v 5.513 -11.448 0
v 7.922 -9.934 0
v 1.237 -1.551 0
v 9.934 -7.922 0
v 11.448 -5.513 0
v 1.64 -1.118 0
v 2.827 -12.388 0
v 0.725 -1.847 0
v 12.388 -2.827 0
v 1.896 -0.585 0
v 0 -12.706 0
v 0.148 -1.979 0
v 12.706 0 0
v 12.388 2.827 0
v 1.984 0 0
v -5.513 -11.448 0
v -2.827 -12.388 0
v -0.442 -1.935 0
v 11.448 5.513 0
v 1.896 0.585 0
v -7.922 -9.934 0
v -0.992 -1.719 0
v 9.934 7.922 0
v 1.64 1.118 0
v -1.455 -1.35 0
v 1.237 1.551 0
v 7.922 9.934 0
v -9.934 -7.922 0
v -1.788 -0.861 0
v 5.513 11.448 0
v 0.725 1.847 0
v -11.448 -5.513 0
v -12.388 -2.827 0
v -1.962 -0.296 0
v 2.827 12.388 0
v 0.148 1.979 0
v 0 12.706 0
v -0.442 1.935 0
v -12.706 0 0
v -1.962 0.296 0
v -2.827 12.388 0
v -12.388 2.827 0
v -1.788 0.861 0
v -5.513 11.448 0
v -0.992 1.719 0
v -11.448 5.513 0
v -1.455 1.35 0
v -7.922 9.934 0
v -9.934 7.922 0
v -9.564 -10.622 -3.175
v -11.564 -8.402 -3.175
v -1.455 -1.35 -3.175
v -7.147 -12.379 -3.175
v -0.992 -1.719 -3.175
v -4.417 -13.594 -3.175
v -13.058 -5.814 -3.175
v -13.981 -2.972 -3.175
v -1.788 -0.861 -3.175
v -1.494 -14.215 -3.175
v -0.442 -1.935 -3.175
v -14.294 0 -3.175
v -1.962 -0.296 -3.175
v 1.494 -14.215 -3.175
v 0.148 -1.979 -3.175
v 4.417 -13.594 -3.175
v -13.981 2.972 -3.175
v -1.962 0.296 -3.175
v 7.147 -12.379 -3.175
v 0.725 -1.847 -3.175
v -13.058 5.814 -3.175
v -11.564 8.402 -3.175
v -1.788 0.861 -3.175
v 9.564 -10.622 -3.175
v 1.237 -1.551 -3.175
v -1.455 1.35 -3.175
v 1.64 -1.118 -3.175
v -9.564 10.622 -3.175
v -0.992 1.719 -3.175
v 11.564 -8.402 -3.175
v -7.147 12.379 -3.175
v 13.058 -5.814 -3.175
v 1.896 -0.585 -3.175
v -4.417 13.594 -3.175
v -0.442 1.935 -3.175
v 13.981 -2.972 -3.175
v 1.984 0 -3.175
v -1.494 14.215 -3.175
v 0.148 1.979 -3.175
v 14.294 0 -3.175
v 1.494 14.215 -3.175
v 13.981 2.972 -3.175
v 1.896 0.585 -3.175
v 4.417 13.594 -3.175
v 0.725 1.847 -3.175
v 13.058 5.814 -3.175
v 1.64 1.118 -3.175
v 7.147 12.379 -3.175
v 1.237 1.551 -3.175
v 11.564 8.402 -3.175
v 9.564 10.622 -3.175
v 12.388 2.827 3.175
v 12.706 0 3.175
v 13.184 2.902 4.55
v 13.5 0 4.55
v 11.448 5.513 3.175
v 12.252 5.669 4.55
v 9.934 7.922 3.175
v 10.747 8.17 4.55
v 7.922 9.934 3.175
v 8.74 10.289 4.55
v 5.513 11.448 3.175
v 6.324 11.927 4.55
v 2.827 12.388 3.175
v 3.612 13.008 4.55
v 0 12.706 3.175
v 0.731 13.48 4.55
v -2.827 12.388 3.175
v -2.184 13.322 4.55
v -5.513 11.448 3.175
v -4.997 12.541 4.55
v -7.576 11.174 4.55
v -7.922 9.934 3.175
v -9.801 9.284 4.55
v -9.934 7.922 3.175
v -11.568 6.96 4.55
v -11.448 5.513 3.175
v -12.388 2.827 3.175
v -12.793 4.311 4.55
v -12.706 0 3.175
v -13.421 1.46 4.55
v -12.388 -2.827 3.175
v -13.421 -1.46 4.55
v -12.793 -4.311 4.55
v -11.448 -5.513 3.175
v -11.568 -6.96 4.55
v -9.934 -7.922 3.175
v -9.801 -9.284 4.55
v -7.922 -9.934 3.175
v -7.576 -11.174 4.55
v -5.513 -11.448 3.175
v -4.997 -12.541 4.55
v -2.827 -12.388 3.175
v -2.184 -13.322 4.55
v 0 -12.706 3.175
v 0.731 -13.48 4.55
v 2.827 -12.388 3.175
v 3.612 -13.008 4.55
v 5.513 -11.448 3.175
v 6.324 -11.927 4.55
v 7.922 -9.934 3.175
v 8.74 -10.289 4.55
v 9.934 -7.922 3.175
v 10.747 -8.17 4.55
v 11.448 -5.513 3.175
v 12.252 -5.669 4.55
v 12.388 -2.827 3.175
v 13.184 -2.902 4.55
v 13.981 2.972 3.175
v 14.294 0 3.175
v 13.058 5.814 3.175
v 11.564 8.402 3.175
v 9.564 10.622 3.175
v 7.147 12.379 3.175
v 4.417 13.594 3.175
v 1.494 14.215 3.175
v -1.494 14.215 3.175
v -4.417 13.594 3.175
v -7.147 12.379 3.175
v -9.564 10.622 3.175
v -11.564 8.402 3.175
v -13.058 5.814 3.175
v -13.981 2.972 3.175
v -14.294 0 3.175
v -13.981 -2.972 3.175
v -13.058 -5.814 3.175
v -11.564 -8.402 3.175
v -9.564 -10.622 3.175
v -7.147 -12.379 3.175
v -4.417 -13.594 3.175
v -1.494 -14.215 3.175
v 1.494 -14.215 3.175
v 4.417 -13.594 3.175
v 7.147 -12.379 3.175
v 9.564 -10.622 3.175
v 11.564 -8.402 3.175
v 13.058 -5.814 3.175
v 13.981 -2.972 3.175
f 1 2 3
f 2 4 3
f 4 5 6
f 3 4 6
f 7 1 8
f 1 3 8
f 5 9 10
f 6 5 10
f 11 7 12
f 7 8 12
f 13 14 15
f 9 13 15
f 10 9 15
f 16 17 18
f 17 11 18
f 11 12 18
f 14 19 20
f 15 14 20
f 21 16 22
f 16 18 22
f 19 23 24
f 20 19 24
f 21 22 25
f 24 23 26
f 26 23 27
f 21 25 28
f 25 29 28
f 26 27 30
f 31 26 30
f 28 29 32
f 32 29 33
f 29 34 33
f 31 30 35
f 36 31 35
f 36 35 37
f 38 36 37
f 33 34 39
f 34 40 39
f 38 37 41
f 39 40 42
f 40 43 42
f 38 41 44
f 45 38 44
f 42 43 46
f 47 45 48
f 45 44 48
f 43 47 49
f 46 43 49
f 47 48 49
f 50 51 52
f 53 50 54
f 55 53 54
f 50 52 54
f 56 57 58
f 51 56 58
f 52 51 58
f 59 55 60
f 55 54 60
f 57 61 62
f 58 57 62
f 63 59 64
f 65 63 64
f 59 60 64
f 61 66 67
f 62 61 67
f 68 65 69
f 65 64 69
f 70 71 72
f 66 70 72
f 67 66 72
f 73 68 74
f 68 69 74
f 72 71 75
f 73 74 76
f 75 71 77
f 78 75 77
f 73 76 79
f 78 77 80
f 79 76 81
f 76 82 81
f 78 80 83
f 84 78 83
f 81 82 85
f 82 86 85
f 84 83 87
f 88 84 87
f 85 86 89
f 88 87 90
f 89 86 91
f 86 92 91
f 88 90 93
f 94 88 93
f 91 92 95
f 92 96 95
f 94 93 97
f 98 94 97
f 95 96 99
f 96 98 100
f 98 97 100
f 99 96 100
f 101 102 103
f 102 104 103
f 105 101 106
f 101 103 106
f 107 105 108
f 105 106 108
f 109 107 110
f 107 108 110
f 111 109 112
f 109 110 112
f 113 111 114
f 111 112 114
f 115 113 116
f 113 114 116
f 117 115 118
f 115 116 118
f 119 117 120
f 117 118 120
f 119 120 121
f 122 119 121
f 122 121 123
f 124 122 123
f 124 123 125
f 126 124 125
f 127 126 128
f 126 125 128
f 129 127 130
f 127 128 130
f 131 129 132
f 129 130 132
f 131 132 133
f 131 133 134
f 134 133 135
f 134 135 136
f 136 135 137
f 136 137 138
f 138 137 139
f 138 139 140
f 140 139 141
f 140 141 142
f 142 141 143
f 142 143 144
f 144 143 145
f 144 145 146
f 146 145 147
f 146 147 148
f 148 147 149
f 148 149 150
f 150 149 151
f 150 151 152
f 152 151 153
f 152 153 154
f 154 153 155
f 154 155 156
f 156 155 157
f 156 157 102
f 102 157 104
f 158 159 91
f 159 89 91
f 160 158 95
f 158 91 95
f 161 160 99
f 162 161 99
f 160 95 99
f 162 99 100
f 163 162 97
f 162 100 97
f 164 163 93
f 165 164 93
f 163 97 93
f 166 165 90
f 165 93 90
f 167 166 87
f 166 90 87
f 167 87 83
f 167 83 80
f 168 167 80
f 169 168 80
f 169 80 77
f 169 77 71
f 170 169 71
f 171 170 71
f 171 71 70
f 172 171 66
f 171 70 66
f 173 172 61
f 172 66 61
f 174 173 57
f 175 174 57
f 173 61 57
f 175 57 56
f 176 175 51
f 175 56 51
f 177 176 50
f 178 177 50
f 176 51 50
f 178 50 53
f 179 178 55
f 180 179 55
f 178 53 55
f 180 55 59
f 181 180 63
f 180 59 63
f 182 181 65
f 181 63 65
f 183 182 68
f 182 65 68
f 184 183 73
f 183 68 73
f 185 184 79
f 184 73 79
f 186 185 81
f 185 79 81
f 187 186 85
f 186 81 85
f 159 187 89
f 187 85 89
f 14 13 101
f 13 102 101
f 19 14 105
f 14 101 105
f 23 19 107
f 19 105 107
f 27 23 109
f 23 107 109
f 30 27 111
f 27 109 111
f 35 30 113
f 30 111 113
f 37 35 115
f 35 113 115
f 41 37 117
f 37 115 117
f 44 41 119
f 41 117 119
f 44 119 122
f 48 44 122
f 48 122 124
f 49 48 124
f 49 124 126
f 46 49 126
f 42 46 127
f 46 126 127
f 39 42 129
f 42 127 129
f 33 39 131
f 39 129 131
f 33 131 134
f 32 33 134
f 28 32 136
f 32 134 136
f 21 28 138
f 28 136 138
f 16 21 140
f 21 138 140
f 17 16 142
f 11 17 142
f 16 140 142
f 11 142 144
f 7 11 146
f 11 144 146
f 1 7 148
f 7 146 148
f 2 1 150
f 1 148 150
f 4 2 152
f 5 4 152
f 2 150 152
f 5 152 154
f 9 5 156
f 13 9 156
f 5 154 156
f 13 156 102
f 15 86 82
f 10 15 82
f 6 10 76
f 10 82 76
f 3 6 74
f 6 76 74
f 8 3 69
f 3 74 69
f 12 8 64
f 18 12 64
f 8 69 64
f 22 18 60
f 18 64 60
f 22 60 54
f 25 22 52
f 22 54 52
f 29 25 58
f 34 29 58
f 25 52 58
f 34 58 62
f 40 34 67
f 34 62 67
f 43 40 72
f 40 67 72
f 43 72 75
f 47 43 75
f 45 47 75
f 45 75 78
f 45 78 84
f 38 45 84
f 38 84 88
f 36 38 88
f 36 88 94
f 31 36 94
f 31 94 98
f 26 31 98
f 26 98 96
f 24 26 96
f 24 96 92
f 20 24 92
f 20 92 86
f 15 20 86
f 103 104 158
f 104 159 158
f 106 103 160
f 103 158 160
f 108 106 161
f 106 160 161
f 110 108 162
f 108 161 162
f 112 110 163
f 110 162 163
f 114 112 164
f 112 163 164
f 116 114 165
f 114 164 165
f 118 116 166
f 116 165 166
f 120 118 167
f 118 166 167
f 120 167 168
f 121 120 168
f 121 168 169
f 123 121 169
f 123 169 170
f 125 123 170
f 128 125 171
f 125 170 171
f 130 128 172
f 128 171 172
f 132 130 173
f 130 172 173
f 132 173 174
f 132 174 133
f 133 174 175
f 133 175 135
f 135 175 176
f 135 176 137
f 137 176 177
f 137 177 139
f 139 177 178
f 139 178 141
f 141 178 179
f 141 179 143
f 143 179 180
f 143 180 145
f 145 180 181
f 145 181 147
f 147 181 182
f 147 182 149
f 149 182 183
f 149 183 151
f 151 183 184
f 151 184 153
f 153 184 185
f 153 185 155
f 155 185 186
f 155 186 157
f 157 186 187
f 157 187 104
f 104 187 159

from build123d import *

# Parameters (mm, degrees)
F2_R     = 1.984375
F3_DEPTH = 7.725815
F4_ANGLE = 180


with BuildPart() as f1:
    # F0 (on Front) → F1 (revolve)
    with BuildSketch(Plane.XZ):
        Polygon((13.5, -4.549815), (14.29375, -3.175), (14.29375, 0), (14.29375, 3.175), (0, 3.175), (0, 0), (12.70625, 0), (12.70625, -3.175), align=None)
    revolve(axis=Axis((0, 0, -9.971488), (0, 0, -1)))

    # F2 (on face) → F3 (cut, through all)
    with BuildSketch(Plane.XY.offset(3.175)):
        Circle(F2_R)
    extrude(amount=-F3_DEPTH, mode=Mode.SUBTRACT)


with BuildPart() as f1_1:
    # F4: moved
    add(f1.part.rotate(Axis((-6.353125, 0, 0), (1, 0, 0)), F4_ANGLE))


solid = f1_1.part
